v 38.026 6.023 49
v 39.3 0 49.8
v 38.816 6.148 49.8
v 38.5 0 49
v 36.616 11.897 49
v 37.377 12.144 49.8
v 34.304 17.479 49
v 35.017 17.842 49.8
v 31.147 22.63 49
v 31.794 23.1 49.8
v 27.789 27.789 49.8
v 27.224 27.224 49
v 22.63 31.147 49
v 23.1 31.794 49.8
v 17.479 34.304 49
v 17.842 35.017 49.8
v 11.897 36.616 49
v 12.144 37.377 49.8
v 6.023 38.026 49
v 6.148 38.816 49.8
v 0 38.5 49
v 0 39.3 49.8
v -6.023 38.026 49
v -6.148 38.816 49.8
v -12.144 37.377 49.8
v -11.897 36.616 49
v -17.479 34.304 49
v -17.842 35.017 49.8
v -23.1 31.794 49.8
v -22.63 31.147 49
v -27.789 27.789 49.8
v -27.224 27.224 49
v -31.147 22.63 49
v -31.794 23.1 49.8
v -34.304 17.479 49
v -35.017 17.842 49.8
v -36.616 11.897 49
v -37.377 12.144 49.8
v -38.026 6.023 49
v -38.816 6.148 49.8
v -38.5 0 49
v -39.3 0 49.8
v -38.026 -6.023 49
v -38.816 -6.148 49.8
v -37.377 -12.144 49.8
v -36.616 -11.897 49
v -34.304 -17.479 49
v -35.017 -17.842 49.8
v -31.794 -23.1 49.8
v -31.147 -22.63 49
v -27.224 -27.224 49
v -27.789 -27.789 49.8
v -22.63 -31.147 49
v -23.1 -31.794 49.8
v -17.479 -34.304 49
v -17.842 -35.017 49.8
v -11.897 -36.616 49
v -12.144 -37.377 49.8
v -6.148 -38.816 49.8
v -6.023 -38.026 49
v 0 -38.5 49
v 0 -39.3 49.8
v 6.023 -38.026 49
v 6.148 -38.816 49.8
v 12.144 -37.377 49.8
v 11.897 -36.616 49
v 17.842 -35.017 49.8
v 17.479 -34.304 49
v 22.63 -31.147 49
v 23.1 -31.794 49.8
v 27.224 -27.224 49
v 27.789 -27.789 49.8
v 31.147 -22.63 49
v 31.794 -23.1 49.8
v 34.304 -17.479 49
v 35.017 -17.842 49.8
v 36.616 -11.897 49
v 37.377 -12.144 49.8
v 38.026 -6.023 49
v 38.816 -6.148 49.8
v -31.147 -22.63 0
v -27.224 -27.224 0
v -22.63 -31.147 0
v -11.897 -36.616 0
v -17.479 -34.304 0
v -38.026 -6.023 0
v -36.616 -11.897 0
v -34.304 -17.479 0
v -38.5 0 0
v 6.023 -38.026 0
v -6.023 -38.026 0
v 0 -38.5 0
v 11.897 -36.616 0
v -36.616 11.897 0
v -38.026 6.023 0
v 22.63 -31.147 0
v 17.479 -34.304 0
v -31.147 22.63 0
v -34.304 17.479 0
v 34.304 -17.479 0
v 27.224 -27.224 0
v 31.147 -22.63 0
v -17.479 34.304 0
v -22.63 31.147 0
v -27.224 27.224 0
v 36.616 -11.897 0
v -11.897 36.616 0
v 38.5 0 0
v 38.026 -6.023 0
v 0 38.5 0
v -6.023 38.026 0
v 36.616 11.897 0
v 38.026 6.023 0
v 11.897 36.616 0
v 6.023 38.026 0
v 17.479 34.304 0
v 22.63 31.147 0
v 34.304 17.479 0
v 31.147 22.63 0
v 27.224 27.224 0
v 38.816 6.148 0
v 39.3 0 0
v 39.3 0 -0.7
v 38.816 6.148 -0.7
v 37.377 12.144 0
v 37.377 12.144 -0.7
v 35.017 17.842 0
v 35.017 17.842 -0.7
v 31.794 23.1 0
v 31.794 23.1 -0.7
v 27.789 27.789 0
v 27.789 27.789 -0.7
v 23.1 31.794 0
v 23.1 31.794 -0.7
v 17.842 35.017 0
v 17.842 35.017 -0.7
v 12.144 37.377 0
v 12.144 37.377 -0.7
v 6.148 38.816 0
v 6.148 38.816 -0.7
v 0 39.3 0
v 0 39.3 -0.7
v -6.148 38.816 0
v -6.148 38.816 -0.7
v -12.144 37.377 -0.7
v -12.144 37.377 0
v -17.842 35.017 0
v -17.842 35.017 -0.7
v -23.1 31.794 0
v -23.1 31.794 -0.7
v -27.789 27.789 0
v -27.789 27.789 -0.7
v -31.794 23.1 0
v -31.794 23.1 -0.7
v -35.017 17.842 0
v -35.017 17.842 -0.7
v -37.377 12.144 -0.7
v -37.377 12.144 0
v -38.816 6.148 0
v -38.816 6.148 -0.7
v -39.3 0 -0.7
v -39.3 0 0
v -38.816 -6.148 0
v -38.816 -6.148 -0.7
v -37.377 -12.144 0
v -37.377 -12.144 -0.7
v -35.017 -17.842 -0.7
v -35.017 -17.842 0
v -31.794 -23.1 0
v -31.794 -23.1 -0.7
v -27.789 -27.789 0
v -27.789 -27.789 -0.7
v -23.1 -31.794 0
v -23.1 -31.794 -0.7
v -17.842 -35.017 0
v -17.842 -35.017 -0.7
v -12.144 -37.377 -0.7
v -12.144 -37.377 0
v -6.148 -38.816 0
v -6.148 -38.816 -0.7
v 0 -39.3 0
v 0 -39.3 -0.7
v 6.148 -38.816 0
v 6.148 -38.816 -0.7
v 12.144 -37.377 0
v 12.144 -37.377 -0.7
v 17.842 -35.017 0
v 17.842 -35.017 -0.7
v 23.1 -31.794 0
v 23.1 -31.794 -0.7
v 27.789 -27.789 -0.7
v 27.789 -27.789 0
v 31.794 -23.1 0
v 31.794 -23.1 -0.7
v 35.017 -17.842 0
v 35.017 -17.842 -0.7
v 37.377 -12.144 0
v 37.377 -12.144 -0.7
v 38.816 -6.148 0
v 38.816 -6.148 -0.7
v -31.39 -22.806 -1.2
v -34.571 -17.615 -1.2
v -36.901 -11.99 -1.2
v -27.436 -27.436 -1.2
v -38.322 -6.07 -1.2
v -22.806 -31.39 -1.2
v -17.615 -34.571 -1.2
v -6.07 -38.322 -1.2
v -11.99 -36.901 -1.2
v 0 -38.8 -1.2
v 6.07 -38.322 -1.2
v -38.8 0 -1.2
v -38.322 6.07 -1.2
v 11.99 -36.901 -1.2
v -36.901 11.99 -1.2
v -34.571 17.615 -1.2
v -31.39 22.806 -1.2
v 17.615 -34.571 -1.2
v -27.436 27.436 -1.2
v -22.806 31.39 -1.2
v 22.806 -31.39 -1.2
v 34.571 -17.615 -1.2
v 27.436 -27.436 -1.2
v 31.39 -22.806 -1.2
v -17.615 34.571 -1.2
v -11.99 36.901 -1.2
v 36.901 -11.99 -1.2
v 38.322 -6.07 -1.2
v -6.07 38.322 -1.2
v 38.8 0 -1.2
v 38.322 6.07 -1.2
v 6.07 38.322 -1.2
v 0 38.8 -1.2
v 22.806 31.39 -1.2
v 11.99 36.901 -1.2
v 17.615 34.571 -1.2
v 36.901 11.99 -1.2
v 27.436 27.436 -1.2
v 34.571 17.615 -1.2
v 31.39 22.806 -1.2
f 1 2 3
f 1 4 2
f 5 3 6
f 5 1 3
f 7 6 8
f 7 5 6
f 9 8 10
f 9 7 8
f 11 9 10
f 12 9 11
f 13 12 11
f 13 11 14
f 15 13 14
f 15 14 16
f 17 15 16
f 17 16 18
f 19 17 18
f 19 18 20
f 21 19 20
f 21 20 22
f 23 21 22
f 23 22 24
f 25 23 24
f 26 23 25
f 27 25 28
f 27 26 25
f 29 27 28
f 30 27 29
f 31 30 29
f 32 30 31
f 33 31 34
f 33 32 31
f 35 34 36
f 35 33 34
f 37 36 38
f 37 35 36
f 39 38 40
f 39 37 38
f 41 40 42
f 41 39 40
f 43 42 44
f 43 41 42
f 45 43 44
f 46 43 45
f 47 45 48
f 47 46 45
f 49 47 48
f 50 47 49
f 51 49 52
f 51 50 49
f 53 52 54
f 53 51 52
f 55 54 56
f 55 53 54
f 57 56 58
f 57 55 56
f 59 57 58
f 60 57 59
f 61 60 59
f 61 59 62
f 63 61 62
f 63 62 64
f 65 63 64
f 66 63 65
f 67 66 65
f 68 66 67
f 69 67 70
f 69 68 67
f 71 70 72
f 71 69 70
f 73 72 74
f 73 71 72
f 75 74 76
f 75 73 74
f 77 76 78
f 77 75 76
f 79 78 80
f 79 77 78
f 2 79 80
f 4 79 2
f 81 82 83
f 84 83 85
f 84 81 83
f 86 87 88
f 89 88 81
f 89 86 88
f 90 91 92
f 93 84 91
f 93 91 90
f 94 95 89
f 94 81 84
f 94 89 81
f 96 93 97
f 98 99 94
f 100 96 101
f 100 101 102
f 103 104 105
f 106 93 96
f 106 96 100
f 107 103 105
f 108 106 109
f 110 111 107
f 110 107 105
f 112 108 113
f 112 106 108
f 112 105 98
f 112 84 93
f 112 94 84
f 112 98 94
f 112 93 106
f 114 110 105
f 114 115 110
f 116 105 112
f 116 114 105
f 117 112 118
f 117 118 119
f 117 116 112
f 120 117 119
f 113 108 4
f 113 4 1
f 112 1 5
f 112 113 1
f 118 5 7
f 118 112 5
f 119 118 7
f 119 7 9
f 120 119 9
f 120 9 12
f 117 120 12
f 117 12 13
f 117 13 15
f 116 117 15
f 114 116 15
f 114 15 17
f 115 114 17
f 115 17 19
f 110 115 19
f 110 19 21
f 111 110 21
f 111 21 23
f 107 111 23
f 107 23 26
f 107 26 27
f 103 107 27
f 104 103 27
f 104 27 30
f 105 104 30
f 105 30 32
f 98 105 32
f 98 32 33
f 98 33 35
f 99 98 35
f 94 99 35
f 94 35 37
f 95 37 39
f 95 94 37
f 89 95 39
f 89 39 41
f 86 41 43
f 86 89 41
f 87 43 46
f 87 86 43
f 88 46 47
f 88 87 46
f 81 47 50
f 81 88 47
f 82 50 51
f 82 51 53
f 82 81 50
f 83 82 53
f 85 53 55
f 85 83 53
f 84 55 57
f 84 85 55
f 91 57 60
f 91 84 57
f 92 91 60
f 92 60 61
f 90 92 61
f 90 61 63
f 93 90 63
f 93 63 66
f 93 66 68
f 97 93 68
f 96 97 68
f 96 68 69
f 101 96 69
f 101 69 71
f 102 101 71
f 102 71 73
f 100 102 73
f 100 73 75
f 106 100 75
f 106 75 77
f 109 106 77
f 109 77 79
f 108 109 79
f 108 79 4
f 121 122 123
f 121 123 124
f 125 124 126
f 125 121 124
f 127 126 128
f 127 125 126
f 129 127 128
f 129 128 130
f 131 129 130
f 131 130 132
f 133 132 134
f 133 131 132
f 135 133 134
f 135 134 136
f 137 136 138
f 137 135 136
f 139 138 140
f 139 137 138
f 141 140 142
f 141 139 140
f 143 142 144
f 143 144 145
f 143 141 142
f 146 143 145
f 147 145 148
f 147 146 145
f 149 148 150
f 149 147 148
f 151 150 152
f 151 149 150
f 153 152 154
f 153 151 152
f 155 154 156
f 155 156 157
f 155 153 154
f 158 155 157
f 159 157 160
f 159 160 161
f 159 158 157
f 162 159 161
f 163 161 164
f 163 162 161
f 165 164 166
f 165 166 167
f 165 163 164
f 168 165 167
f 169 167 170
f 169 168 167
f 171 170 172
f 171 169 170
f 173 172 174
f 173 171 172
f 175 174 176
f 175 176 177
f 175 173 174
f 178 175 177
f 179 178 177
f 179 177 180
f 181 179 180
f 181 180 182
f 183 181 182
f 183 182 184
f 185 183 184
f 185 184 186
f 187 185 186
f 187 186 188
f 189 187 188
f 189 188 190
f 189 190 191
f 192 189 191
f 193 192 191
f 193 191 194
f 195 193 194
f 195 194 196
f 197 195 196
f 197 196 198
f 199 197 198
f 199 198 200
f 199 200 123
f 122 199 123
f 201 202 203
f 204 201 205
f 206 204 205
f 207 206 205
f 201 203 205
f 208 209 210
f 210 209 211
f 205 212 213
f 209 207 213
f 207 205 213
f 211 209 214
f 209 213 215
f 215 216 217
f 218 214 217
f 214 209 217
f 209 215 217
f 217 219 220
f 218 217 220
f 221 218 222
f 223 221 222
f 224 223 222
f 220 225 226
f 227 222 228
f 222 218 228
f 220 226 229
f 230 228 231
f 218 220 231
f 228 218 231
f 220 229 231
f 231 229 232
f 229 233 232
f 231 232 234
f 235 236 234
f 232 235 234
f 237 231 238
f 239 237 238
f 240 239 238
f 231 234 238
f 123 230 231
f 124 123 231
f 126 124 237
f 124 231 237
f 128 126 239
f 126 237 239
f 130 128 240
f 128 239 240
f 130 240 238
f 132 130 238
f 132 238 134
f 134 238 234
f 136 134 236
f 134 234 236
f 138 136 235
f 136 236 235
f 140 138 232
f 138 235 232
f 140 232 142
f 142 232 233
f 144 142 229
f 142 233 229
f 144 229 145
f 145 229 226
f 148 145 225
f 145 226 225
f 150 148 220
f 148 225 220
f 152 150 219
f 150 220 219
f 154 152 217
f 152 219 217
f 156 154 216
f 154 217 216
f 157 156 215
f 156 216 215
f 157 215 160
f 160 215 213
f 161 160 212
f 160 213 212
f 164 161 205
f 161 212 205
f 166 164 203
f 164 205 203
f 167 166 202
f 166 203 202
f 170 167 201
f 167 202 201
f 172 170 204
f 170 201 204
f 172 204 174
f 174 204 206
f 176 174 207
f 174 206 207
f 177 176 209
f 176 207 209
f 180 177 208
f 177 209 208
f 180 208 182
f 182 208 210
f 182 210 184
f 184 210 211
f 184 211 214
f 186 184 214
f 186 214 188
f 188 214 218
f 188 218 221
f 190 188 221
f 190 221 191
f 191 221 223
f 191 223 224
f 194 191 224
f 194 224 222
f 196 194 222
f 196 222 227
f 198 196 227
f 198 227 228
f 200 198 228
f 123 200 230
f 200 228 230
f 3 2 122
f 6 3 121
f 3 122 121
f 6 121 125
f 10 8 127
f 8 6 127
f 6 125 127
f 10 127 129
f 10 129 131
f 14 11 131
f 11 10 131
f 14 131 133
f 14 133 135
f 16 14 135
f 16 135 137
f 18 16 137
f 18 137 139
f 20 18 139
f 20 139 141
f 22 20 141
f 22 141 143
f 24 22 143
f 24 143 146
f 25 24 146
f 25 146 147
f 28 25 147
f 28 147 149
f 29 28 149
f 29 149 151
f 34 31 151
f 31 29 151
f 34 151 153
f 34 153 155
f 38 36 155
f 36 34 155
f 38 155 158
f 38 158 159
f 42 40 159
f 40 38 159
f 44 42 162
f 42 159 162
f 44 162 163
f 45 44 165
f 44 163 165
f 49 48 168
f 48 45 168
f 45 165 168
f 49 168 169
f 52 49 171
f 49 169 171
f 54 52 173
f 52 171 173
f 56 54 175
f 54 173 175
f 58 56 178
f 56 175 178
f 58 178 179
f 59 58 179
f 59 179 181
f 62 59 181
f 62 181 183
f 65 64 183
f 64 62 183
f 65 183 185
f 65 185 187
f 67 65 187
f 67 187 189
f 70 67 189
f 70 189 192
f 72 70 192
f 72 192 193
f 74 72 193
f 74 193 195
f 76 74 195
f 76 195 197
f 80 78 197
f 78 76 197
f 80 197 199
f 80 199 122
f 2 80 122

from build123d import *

# Parameters (mm, degrees)
F0_R     = 39.3
F0_R_2   = 38.5
F1_DEPTH = 1.2
F2_DEPTH = 50
F4_SIZE  = 0.5


# Not quite as in the source:
# - a fillet or chamfer that OpenCascade refuses, or shapes differently, is made with other operations: its cross-section is extruded or revolved along the edge and cut away or added


with BuildPart() as f1:
    # F0 (on Top) → F1 (new body)
    with BuildSketch(Plane.XY):
        Circle(F0_R)
        Circle(F0_R_2, mode=Mode.SUBTRACT)
        Circle(F0_R_2)
    extrude(amount=-F1_DEPTH)

    # F0 (on Top) → F2 (join)
    with BuildSketch(Plane.XY):
        Circle(F0_R)
        Circle(F0_R_2, mode=Mode.SUBTRACT)
    extrude(amount=F2_DEPTH)

    # F3: chamfer of 1 on 1 edges, made by hand

    # F3_s1 → F3_t2 (revolve, cut)
    with BuildSketch(Plane.XZ):
        Polygon((39.5, 50), (38.5, 49), (38.5, 50), align=None)
    revolve(axis=Axis((0, 0, 50), (0, 0, 1)), mode=Mode.SUBTRACT)

    # F4
    f4_edges = [f1.edges().sort_by_distance(p)[0] for p in [
        (-39.3, 0, -1.2),
    ]]
    chamfer(f4_edges, length=F4_SIZE)


solid = f1.part
